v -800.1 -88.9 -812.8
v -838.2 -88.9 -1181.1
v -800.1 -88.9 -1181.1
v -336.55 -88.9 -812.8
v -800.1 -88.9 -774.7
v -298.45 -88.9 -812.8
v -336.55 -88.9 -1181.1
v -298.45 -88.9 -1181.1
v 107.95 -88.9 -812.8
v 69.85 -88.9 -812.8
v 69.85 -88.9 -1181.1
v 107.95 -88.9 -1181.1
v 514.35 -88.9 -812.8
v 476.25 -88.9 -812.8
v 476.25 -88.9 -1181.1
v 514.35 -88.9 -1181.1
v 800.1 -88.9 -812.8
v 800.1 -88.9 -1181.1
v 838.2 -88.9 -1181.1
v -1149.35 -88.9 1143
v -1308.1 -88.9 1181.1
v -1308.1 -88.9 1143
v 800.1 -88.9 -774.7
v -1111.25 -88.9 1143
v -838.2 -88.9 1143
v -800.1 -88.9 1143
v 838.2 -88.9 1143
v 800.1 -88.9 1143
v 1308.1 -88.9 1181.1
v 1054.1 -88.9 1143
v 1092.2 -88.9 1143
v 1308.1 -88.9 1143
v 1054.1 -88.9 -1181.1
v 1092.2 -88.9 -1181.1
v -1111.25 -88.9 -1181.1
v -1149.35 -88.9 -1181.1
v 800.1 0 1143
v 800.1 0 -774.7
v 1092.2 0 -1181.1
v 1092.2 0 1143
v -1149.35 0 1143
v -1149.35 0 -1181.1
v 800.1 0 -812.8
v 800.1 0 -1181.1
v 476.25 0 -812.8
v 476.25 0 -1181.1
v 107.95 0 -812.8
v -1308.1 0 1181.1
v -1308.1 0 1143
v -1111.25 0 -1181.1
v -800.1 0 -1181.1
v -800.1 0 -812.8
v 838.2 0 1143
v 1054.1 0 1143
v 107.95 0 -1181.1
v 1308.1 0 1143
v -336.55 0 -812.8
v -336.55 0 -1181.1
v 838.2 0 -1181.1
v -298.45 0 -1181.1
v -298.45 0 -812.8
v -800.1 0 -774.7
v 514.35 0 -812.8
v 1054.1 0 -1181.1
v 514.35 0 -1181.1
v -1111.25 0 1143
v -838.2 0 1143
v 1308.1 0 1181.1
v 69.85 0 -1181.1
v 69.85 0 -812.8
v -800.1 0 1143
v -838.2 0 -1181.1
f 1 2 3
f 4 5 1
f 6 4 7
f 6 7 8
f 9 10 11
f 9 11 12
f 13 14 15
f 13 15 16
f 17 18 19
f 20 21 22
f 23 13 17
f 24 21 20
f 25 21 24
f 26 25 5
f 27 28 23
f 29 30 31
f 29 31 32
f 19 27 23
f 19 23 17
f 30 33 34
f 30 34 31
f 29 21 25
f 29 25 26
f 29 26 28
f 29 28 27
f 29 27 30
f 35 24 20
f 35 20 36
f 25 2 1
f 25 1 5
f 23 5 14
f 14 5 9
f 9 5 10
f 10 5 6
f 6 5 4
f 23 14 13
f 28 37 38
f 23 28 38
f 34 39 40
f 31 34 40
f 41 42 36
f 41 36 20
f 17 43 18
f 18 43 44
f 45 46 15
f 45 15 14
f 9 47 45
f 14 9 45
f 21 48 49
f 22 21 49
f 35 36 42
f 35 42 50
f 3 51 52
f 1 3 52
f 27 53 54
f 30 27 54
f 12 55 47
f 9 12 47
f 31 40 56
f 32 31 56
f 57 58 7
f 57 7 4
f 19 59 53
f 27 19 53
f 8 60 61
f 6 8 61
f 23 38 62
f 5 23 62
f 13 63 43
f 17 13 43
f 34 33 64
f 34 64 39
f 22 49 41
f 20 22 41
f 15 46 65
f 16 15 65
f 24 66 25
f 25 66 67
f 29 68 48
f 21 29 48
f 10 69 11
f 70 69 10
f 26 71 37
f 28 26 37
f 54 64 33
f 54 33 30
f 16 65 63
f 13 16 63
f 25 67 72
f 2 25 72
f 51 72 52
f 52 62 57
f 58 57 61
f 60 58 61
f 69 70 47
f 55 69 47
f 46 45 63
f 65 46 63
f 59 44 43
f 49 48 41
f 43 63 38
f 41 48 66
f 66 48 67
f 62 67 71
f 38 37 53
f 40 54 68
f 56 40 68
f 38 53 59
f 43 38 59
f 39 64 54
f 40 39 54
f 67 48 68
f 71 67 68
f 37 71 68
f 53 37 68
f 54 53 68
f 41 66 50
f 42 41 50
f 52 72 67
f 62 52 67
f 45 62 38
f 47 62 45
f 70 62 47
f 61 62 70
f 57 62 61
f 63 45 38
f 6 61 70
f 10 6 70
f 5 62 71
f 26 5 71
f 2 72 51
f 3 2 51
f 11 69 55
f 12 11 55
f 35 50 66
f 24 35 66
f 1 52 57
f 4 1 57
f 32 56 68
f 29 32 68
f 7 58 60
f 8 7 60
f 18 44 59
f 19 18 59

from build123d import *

# Parameters (mm, degrees)
F0_W     = 38.1
F0_H     = 368.3
F0_H_2   = 2324.1
F1_DEPTH = 88.9


with BuildPart() as f1:
    # F0 (on Front) → F1 (new body)
    with BuildSketch(Plane.XZ):
        with Locations((495.3, -996.95)):
            Rectangle(F0_W, F0_H)
        with Locations((88.9, -996.95)):
            Rectangle(F0_W, F0_H)
        with Locations((-317.5, -996.95)):
            Rectangle(F0_W, F0_H)
        with Locations((-1130.3, -19.05)):
            Rectangle(F0_W, F0_H_2)
        with Locations((1073.15, -19.05)):
            Rectangle(F0_W, F0_H_2)
        Polygon((838.2, 1143), (800.1, 1143), (800.1, -774.7), (800.1, -812.8), (800.1, -1181.1), (838.2, -1181.1), align=None)
        Polygon((-838.2, 1143), (-838.2, -1181.1), (-800.1, -1181.1), (-800.1, -812.8), (-800.1, -774.7), (-800.1, 1143), align=None)
        Polygon((-1308.1, 1181.1), (-1308.1, 1143), (-1149.35, 1143), (-1111.25, 1143), (-838.2, 1143), (-800.1, 1143), (800.1, 1143), (838.2, 1143), (1054.1, 1143), (1092.2, 1143), (1308.1, 1143), (1308.1, 1181.1), align=None)
        Polygon((-800.1, -774.7), (-800.1, -812.8), (-336.55, -812.8), (-298.45, -812.8), (69.85, -812.8), (107.95, -812.8), (476.25, -812.8), (514.35, -812.8), (800.1, -812.8), (800.1, -774.7), align=None)
    extrude(amount=F1_DEPTH)


solid = f1.part
